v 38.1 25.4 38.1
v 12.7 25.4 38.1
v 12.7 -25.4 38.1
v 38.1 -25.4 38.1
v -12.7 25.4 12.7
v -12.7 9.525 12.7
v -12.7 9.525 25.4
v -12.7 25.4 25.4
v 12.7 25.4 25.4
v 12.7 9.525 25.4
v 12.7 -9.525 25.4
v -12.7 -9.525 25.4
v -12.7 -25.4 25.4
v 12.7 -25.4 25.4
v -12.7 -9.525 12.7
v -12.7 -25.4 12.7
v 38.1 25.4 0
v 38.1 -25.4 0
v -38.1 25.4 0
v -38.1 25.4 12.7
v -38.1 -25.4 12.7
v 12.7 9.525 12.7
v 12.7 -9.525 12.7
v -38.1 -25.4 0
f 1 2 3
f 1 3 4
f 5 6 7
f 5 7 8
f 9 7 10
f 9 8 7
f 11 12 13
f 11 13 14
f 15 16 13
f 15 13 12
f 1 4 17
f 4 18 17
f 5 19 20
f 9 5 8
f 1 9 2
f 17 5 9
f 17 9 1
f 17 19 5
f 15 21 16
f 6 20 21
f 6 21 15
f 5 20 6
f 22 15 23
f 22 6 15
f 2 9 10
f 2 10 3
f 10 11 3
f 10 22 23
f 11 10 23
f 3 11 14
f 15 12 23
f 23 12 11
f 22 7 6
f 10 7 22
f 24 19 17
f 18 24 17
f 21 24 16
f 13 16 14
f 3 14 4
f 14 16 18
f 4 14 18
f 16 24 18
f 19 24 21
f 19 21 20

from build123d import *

# Parameters (mm, degrees)
F0_W     = 76.2
F0_H     = 50.8
F1_DEPTH = 12.7
F2_W     = 50.8
F2_H     = 50.8
F3_DEPTH = 12.7
F4_W     = 25.4
F4_H     = 19.05
F5_DEPTH = 12.7
F6_W     = 25.4
F6_H     = 50.8
F7_DEPTH = 12.7


with BuildPart() as f1:
    # F0 (on Top) → F1 (new body)
    with BuildSketch(Plane.XY):
        Rectangle(F0_W, F0_H)
    extrude(amount=F1_DEPTH)

    # F2 (on face) → F3 (join)
    with BuildSketch(Plane.XY.offset(12.7)):
        with Locations((12.7, 0)):
            Rectangle(F2_W, F2_H)
    extrude(amount=F3_DEPTH)

    # F4 (on face) → F5 (cut)
    with BuildSketch(Plane.XY.offset(25.4)):
        Rectangle(F4_W, F4_H)
    extrude(amount=-F5_DEPTH, mode=Mode.SUBTRACT)

    # F6 (on face) → F7 (join)
    with BuildSketch(Plane.XY.offset(25.4)):
        with Locations((25.4, 0)):
            Rectangle(F6_W, F6_H)
        Polygon((38.1, -25.4), (38.1, 25.4), (12.7, 25.4), (12.7, 9.525), (12.7, -9.525), (12.7, -25.4), align=None)
    extrude(amount=F7_DEPTH)


solid = f1.part
